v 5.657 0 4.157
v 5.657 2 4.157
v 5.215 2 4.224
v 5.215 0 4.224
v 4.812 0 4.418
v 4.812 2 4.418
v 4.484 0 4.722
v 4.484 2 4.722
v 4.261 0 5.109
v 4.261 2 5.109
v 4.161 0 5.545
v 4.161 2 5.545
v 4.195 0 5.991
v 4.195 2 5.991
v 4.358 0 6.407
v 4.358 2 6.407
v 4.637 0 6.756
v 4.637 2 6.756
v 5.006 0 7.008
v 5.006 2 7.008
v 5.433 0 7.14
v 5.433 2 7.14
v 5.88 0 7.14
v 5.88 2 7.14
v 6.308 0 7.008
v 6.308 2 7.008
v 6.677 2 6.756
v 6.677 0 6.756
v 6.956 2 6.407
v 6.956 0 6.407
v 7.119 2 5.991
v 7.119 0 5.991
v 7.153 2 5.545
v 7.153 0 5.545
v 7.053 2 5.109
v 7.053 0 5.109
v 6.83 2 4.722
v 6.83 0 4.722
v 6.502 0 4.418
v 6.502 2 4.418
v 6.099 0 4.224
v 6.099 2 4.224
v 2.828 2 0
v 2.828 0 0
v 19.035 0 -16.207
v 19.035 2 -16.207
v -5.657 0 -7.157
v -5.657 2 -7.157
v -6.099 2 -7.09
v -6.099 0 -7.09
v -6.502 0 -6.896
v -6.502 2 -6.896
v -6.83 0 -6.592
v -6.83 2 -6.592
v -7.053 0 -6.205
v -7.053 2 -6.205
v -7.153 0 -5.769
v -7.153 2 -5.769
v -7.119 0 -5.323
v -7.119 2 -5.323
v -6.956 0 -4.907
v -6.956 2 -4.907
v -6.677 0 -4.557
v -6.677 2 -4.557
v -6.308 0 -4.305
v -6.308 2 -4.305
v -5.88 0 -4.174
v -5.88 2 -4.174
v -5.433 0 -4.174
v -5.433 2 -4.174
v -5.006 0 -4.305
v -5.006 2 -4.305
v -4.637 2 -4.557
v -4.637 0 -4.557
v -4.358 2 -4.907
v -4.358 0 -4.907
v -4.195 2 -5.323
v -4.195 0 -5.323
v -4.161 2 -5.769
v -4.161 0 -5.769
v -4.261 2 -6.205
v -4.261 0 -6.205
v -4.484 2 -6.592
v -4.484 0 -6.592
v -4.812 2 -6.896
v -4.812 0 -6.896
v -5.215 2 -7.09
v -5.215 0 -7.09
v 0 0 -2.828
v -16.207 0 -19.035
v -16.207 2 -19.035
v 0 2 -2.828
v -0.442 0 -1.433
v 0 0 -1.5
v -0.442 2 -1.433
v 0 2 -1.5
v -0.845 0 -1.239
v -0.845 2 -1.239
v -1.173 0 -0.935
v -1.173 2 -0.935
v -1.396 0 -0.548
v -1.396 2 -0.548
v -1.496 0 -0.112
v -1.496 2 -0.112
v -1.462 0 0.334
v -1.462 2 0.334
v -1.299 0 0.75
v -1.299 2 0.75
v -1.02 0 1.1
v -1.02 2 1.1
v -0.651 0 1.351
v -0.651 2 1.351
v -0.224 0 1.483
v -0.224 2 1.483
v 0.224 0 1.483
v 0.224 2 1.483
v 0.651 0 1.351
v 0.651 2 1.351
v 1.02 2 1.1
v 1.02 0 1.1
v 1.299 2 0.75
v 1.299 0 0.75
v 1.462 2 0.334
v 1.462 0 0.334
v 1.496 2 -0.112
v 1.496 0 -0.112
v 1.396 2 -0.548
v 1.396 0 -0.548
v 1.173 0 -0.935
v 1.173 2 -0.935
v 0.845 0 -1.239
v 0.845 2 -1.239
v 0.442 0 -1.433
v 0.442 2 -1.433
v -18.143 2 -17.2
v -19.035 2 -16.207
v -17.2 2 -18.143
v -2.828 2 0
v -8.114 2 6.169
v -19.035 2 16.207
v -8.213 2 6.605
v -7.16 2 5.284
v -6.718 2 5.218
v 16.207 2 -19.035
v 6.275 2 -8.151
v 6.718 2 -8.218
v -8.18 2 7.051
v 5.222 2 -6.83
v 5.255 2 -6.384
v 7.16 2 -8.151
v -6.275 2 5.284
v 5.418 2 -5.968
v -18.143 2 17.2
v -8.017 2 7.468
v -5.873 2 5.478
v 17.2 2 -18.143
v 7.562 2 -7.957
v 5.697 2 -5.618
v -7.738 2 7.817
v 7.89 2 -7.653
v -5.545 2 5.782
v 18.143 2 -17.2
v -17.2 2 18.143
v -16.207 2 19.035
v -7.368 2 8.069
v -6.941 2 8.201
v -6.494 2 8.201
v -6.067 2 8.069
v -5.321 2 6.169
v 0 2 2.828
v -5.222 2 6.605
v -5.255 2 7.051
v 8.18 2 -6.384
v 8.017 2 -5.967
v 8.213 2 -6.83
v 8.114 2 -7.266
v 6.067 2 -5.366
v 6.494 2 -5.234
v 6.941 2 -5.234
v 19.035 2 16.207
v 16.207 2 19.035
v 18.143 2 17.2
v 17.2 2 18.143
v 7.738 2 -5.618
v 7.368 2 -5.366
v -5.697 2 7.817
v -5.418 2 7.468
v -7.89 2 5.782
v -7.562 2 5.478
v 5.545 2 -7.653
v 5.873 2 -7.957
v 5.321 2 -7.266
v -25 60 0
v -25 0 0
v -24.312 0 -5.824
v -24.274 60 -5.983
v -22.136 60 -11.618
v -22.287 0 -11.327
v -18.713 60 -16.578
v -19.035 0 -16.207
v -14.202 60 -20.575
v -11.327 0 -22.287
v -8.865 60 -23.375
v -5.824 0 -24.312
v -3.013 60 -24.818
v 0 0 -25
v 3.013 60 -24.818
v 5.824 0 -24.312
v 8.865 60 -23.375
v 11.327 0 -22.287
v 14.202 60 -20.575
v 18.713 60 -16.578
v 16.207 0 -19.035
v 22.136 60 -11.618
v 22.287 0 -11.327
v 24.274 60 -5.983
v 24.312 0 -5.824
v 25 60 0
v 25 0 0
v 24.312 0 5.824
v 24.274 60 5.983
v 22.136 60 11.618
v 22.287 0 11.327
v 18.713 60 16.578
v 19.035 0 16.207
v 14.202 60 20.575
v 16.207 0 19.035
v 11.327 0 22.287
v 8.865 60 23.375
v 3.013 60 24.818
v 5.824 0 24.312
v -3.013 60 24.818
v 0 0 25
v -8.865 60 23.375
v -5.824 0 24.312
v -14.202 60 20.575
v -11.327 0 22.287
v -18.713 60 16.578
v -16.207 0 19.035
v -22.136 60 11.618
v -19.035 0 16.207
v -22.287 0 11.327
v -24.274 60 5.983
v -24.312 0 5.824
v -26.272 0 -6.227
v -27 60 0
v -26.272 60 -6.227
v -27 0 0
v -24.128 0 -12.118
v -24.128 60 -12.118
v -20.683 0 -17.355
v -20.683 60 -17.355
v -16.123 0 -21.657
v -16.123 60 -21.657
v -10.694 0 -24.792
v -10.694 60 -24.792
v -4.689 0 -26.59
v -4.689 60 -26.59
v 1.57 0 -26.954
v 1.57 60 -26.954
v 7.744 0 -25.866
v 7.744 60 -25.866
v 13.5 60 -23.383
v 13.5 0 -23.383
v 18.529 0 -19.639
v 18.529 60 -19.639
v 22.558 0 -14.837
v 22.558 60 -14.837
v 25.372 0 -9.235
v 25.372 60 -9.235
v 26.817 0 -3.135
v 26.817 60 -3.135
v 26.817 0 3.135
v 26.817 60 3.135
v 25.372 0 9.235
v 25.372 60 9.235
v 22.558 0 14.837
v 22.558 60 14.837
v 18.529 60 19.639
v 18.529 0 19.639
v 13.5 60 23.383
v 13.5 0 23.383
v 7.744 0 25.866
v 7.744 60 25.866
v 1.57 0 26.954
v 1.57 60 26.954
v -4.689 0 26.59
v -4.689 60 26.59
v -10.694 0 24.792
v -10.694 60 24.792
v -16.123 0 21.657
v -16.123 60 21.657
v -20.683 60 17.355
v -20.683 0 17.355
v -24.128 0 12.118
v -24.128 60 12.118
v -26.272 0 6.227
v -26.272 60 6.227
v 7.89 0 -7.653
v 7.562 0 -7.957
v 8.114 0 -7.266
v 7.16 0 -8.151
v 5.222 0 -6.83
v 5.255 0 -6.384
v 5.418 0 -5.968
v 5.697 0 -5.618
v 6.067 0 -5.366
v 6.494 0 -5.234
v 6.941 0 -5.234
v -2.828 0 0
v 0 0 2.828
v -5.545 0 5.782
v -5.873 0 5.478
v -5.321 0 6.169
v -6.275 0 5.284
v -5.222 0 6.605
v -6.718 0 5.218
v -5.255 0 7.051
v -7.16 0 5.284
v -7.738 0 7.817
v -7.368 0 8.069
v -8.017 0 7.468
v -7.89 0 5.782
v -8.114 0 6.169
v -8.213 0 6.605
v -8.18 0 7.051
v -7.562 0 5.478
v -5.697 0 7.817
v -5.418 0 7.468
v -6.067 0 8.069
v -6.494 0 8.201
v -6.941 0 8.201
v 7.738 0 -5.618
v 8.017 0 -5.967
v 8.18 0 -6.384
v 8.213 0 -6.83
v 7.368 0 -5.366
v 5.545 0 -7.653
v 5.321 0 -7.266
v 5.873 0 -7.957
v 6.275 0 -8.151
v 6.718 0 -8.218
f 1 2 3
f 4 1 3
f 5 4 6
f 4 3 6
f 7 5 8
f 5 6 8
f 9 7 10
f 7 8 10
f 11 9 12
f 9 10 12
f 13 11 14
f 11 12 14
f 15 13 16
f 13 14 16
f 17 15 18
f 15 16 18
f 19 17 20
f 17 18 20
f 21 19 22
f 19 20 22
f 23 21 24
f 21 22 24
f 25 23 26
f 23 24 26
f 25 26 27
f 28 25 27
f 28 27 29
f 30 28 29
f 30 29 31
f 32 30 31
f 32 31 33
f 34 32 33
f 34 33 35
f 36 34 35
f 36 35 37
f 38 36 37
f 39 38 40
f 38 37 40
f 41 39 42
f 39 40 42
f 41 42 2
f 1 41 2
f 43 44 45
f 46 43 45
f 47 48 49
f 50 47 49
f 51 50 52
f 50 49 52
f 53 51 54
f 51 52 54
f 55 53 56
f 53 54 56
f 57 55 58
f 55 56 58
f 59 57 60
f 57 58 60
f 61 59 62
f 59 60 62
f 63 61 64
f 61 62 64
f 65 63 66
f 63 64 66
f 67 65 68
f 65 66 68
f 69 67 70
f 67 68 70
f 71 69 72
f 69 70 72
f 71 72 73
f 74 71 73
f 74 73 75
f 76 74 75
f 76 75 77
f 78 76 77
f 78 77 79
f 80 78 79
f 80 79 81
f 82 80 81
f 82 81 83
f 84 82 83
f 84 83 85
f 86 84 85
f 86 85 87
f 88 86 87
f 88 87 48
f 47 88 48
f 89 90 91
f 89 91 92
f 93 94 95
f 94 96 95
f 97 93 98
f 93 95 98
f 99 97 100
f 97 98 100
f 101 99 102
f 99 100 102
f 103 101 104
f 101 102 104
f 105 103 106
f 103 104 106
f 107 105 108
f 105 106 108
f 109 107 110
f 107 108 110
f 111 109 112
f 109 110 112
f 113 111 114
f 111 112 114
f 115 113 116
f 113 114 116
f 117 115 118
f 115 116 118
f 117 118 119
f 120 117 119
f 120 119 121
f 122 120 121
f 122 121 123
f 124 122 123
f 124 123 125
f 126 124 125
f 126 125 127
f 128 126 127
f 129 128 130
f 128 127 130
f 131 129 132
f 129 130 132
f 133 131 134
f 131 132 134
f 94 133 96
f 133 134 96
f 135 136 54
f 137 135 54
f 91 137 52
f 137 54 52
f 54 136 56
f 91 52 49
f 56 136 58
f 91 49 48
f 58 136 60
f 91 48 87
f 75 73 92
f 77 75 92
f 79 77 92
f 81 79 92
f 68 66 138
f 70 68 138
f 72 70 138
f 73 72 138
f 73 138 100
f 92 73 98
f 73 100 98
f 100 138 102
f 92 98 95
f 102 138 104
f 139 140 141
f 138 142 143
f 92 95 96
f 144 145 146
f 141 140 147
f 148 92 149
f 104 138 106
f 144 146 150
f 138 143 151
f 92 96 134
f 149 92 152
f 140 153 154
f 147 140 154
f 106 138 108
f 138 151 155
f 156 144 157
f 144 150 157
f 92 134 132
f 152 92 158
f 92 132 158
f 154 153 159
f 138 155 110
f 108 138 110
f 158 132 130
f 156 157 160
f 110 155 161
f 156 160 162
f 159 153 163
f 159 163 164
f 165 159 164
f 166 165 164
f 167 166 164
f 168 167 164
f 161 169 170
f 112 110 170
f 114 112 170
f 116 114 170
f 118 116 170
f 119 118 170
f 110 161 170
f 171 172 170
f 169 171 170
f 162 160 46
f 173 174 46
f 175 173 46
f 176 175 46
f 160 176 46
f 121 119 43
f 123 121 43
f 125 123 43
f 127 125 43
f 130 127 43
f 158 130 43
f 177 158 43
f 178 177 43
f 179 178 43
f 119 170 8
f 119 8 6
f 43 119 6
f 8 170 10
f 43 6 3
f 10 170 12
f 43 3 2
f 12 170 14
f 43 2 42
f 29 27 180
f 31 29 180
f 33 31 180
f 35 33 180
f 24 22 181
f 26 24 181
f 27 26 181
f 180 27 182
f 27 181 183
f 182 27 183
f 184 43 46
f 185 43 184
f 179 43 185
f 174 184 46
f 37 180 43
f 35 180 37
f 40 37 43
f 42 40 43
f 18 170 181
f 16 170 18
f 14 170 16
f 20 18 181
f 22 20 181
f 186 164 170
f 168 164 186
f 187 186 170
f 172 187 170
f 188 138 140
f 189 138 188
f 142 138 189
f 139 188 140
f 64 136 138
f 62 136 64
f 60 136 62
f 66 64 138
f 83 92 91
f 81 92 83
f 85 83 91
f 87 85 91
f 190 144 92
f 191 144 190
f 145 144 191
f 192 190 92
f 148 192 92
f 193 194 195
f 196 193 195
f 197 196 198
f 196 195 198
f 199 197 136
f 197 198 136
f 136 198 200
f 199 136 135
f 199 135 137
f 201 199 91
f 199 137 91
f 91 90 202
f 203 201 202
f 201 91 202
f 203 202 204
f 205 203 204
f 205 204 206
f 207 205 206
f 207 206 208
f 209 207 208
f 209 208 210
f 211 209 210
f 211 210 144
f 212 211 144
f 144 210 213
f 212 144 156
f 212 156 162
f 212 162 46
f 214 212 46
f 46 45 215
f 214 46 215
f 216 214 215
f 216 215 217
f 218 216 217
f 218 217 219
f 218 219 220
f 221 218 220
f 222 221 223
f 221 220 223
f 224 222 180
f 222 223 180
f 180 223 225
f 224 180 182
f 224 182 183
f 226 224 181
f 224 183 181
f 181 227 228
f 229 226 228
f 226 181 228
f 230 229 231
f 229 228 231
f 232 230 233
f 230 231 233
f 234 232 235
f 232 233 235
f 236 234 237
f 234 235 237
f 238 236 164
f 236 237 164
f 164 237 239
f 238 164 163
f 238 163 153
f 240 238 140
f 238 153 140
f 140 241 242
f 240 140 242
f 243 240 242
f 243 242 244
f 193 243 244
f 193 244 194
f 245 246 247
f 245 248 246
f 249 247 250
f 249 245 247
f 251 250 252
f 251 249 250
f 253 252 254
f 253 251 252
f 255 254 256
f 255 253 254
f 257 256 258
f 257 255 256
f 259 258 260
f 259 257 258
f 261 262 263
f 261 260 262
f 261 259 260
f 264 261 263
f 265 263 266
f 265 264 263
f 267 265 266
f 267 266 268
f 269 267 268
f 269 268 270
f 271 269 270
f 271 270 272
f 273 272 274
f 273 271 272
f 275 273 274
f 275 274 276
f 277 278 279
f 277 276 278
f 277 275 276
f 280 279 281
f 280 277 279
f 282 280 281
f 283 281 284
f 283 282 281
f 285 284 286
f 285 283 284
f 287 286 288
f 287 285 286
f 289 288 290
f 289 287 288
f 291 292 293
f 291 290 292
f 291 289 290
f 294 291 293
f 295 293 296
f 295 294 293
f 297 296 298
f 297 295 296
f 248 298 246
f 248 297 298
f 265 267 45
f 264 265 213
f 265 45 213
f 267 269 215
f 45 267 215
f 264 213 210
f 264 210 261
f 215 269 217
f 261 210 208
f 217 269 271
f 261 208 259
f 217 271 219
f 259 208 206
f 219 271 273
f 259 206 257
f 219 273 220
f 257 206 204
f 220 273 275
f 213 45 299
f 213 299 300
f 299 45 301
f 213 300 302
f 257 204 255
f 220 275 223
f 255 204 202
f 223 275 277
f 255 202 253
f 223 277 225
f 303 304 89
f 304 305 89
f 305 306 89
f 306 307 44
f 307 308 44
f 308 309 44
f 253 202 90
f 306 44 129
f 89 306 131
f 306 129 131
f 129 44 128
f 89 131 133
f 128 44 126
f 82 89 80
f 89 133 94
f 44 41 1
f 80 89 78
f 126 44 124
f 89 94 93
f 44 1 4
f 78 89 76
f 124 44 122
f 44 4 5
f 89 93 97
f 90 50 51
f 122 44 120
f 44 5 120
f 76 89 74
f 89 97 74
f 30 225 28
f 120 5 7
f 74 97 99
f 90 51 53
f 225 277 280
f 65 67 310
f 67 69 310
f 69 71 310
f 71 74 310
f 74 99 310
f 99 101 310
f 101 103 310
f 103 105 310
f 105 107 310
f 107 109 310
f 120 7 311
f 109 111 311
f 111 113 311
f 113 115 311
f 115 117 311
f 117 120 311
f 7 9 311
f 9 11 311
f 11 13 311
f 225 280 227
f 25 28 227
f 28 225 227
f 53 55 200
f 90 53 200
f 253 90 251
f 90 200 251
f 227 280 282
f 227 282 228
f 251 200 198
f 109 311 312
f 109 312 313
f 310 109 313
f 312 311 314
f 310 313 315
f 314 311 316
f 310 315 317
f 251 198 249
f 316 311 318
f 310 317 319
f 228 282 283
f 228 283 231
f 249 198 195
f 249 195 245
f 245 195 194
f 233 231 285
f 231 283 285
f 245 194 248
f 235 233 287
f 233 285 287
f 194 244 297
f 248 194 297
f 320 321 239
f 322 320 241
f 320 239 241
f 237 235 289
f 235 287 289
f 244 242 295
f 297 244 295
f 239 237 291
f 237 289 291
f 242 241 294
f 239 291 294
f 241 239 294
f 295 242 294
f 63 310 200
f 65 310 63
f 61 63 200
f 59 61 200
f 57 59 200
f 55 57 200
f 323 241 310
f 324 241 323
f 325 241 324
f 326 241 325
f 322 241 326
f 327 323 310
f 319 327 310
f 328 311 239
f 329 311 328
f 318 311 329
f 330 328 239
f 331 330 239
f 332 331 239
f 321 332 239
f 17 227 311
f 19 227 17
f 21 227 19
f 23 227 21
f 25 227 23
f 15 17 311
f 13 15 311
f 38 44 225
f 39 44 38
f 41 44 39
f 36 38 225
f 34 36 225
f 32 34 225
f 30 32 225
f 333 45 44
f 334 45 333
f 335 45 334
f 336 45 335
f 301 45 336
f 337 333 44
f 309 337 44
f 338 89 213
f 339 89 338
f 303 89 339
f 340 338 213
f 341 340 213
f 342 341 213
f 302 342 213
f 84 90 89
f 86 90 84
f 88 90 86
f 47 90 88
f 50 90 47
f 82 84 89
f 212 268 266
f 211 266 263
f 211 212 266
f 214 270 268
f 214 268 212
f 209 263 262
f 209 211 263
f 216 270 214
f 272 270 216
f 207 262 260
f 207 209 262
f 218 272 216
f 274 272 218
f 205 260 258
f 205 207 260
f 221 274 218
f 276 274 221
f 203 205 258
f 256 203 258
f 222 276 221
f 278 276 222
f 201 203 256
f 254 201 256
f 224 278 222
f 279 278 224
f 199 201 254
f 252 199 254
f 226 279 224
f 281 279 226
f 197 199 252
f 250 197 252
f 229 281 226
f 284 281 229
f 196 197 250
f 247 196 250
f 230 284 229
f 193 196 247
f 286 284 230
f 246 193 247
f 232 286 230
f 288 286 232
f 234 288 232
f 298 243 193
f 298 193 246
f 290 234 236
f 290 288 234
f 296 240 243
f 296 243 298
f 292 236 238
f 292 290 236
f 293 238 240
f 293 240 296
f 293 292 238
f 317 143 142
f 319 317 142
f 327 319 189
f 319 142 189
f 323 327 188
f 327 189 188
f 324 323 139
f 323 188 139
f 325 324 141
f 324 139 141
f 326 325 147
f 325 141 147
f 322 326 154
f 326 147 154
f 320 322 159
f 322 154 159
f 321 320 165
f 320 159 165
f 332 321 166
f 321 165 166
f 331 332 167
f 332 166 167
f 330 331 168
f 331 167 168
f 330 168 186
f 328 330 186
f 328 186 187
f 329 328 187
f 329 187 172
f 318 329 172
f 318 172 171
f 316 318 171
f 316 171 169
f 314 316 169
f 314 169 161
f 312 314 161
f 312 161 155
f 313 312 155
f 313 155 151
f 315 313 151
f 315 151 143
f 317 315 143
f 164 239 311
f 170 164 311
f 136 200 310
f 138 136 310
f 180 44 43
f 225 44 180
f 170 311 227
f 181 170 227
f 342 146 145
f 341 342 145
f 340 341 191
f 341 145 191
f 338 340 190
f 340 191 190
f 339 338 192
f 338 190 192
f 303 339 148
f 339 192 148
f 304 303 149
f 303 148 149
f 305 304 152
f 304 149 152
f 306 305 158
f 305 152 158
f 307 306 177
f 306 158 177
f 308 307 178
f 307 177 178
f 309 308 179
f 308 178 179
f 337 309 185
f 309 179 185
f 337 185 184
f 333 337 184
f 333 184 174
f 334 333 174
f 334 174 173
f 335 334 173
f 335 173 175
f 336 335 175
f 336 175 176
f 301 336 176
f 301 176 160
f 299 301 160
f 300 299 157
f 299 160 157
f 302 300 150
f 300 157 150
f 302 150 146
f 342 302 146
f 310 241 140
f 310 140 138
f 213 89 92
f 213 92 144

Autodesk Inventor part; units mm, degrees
ref_plane "YZ Plane" through (0, 0, 0) normal (1, 0, 0) x (0, 1, 0)
ref_plane "XZ Plane" through (0, 0, 0) normal (0, 1, 0) x (-1, 0, 0)
ref_plane "XY Plane" through (0, 0, 0) normal (0, 0, 1) x (1, 0, 0)
sketch "草圖1" plane through (0, 0, 0) normal (0, 1, 0) x (-1, 0, 0)
  circle A0 centre (0, 0) radius 25
  circle A1 centre (0, 0) radius 27
  dimension "d0" = 50
  dimension "d1" = 2
extrude "擠出1" add sketch "草圖1" along normal blind 60
sketch "草圖2" plane through (0, 0, 0) normal (0, -1, 0) x (1, 0, 0)
  circle A0 centre (0, 0) radius 25 construction
  line L0 (-25, 0) -> (25, 0) construction
  line L1 (-17.6777, 17.6777) -> (17.6777, -17.6777) construction
  line L2 (-16.2068, 19.0352) -> (19.0352, -16.2068)
  line L3 (-19.0352, 16.2068) -> (16.2068, -19.0352)
  arc A1 (-16.2068, 19.0352) -> (-19.0352, 16.2068) centre (0, 0) ccw
  arc A2 (16.2068, -19.0352) -> (19.0352, -16.2068) centre (0, 0) ccw
  line L4 (-19.0352, -16.2068) -> (16.2068, 19.0352)
  arc A3 (-19.0352, -16.2068) -> (-16.2068, -19.0352) centre (0, 0) ccw
  line L5 (-16.2068, -19.0352) -> (19.0352, 16.2068)
  arc A4 (19.0352, 16.2068) -> (16.2068, 19.0352) centre (0, 0) ccw
  dimension "d10" = 45
  dimension "d11" = 2
  dimension "d14" = 90
extrude "擠出3" add sketch "草圖2" against normal blind 2
sketch "草圖5" plane through (0, 0, 0) normal (0, -1, 0) x (1, 0, 0)
  circle A0 centre (0, 0) radius 25 construction
  line L0 (17.6777, 17.6777) -> (-17.6777, -17.6777) construction
  line L1 (-17.6777, 17.6777) -> (17.6777, -17.6777) construction
  line L2 (-25, 0) -> (25, 0) construction
  arc A1 (19.0352, -16.2068) -> (19.0352, 16.2068) centre (0, 0) ccw construction
  point P0 (5.6569, 5.6569)
  point P1 (-6.7175, 6.7175)
  point P2 (0, 0)
  point P3 (-5.6569, -5.6569)
  point P4 (6.7175, -6.7175)
  dimension "d18" = 45
  dimension "d19" = 45
  dimension "d20" = 9.5
  dimension "d21" = 8
  dimension "d24" = 180
hole "孔1" at (0, 0, 0) at (5.6569, 0, 5.6569) at (-6.7175, 0, 6.7175) at (-5.6569, 0, -5.6569) at (6.7175, 0, -6.7175) direction (0, 1, 0) diameter 3 end through all
